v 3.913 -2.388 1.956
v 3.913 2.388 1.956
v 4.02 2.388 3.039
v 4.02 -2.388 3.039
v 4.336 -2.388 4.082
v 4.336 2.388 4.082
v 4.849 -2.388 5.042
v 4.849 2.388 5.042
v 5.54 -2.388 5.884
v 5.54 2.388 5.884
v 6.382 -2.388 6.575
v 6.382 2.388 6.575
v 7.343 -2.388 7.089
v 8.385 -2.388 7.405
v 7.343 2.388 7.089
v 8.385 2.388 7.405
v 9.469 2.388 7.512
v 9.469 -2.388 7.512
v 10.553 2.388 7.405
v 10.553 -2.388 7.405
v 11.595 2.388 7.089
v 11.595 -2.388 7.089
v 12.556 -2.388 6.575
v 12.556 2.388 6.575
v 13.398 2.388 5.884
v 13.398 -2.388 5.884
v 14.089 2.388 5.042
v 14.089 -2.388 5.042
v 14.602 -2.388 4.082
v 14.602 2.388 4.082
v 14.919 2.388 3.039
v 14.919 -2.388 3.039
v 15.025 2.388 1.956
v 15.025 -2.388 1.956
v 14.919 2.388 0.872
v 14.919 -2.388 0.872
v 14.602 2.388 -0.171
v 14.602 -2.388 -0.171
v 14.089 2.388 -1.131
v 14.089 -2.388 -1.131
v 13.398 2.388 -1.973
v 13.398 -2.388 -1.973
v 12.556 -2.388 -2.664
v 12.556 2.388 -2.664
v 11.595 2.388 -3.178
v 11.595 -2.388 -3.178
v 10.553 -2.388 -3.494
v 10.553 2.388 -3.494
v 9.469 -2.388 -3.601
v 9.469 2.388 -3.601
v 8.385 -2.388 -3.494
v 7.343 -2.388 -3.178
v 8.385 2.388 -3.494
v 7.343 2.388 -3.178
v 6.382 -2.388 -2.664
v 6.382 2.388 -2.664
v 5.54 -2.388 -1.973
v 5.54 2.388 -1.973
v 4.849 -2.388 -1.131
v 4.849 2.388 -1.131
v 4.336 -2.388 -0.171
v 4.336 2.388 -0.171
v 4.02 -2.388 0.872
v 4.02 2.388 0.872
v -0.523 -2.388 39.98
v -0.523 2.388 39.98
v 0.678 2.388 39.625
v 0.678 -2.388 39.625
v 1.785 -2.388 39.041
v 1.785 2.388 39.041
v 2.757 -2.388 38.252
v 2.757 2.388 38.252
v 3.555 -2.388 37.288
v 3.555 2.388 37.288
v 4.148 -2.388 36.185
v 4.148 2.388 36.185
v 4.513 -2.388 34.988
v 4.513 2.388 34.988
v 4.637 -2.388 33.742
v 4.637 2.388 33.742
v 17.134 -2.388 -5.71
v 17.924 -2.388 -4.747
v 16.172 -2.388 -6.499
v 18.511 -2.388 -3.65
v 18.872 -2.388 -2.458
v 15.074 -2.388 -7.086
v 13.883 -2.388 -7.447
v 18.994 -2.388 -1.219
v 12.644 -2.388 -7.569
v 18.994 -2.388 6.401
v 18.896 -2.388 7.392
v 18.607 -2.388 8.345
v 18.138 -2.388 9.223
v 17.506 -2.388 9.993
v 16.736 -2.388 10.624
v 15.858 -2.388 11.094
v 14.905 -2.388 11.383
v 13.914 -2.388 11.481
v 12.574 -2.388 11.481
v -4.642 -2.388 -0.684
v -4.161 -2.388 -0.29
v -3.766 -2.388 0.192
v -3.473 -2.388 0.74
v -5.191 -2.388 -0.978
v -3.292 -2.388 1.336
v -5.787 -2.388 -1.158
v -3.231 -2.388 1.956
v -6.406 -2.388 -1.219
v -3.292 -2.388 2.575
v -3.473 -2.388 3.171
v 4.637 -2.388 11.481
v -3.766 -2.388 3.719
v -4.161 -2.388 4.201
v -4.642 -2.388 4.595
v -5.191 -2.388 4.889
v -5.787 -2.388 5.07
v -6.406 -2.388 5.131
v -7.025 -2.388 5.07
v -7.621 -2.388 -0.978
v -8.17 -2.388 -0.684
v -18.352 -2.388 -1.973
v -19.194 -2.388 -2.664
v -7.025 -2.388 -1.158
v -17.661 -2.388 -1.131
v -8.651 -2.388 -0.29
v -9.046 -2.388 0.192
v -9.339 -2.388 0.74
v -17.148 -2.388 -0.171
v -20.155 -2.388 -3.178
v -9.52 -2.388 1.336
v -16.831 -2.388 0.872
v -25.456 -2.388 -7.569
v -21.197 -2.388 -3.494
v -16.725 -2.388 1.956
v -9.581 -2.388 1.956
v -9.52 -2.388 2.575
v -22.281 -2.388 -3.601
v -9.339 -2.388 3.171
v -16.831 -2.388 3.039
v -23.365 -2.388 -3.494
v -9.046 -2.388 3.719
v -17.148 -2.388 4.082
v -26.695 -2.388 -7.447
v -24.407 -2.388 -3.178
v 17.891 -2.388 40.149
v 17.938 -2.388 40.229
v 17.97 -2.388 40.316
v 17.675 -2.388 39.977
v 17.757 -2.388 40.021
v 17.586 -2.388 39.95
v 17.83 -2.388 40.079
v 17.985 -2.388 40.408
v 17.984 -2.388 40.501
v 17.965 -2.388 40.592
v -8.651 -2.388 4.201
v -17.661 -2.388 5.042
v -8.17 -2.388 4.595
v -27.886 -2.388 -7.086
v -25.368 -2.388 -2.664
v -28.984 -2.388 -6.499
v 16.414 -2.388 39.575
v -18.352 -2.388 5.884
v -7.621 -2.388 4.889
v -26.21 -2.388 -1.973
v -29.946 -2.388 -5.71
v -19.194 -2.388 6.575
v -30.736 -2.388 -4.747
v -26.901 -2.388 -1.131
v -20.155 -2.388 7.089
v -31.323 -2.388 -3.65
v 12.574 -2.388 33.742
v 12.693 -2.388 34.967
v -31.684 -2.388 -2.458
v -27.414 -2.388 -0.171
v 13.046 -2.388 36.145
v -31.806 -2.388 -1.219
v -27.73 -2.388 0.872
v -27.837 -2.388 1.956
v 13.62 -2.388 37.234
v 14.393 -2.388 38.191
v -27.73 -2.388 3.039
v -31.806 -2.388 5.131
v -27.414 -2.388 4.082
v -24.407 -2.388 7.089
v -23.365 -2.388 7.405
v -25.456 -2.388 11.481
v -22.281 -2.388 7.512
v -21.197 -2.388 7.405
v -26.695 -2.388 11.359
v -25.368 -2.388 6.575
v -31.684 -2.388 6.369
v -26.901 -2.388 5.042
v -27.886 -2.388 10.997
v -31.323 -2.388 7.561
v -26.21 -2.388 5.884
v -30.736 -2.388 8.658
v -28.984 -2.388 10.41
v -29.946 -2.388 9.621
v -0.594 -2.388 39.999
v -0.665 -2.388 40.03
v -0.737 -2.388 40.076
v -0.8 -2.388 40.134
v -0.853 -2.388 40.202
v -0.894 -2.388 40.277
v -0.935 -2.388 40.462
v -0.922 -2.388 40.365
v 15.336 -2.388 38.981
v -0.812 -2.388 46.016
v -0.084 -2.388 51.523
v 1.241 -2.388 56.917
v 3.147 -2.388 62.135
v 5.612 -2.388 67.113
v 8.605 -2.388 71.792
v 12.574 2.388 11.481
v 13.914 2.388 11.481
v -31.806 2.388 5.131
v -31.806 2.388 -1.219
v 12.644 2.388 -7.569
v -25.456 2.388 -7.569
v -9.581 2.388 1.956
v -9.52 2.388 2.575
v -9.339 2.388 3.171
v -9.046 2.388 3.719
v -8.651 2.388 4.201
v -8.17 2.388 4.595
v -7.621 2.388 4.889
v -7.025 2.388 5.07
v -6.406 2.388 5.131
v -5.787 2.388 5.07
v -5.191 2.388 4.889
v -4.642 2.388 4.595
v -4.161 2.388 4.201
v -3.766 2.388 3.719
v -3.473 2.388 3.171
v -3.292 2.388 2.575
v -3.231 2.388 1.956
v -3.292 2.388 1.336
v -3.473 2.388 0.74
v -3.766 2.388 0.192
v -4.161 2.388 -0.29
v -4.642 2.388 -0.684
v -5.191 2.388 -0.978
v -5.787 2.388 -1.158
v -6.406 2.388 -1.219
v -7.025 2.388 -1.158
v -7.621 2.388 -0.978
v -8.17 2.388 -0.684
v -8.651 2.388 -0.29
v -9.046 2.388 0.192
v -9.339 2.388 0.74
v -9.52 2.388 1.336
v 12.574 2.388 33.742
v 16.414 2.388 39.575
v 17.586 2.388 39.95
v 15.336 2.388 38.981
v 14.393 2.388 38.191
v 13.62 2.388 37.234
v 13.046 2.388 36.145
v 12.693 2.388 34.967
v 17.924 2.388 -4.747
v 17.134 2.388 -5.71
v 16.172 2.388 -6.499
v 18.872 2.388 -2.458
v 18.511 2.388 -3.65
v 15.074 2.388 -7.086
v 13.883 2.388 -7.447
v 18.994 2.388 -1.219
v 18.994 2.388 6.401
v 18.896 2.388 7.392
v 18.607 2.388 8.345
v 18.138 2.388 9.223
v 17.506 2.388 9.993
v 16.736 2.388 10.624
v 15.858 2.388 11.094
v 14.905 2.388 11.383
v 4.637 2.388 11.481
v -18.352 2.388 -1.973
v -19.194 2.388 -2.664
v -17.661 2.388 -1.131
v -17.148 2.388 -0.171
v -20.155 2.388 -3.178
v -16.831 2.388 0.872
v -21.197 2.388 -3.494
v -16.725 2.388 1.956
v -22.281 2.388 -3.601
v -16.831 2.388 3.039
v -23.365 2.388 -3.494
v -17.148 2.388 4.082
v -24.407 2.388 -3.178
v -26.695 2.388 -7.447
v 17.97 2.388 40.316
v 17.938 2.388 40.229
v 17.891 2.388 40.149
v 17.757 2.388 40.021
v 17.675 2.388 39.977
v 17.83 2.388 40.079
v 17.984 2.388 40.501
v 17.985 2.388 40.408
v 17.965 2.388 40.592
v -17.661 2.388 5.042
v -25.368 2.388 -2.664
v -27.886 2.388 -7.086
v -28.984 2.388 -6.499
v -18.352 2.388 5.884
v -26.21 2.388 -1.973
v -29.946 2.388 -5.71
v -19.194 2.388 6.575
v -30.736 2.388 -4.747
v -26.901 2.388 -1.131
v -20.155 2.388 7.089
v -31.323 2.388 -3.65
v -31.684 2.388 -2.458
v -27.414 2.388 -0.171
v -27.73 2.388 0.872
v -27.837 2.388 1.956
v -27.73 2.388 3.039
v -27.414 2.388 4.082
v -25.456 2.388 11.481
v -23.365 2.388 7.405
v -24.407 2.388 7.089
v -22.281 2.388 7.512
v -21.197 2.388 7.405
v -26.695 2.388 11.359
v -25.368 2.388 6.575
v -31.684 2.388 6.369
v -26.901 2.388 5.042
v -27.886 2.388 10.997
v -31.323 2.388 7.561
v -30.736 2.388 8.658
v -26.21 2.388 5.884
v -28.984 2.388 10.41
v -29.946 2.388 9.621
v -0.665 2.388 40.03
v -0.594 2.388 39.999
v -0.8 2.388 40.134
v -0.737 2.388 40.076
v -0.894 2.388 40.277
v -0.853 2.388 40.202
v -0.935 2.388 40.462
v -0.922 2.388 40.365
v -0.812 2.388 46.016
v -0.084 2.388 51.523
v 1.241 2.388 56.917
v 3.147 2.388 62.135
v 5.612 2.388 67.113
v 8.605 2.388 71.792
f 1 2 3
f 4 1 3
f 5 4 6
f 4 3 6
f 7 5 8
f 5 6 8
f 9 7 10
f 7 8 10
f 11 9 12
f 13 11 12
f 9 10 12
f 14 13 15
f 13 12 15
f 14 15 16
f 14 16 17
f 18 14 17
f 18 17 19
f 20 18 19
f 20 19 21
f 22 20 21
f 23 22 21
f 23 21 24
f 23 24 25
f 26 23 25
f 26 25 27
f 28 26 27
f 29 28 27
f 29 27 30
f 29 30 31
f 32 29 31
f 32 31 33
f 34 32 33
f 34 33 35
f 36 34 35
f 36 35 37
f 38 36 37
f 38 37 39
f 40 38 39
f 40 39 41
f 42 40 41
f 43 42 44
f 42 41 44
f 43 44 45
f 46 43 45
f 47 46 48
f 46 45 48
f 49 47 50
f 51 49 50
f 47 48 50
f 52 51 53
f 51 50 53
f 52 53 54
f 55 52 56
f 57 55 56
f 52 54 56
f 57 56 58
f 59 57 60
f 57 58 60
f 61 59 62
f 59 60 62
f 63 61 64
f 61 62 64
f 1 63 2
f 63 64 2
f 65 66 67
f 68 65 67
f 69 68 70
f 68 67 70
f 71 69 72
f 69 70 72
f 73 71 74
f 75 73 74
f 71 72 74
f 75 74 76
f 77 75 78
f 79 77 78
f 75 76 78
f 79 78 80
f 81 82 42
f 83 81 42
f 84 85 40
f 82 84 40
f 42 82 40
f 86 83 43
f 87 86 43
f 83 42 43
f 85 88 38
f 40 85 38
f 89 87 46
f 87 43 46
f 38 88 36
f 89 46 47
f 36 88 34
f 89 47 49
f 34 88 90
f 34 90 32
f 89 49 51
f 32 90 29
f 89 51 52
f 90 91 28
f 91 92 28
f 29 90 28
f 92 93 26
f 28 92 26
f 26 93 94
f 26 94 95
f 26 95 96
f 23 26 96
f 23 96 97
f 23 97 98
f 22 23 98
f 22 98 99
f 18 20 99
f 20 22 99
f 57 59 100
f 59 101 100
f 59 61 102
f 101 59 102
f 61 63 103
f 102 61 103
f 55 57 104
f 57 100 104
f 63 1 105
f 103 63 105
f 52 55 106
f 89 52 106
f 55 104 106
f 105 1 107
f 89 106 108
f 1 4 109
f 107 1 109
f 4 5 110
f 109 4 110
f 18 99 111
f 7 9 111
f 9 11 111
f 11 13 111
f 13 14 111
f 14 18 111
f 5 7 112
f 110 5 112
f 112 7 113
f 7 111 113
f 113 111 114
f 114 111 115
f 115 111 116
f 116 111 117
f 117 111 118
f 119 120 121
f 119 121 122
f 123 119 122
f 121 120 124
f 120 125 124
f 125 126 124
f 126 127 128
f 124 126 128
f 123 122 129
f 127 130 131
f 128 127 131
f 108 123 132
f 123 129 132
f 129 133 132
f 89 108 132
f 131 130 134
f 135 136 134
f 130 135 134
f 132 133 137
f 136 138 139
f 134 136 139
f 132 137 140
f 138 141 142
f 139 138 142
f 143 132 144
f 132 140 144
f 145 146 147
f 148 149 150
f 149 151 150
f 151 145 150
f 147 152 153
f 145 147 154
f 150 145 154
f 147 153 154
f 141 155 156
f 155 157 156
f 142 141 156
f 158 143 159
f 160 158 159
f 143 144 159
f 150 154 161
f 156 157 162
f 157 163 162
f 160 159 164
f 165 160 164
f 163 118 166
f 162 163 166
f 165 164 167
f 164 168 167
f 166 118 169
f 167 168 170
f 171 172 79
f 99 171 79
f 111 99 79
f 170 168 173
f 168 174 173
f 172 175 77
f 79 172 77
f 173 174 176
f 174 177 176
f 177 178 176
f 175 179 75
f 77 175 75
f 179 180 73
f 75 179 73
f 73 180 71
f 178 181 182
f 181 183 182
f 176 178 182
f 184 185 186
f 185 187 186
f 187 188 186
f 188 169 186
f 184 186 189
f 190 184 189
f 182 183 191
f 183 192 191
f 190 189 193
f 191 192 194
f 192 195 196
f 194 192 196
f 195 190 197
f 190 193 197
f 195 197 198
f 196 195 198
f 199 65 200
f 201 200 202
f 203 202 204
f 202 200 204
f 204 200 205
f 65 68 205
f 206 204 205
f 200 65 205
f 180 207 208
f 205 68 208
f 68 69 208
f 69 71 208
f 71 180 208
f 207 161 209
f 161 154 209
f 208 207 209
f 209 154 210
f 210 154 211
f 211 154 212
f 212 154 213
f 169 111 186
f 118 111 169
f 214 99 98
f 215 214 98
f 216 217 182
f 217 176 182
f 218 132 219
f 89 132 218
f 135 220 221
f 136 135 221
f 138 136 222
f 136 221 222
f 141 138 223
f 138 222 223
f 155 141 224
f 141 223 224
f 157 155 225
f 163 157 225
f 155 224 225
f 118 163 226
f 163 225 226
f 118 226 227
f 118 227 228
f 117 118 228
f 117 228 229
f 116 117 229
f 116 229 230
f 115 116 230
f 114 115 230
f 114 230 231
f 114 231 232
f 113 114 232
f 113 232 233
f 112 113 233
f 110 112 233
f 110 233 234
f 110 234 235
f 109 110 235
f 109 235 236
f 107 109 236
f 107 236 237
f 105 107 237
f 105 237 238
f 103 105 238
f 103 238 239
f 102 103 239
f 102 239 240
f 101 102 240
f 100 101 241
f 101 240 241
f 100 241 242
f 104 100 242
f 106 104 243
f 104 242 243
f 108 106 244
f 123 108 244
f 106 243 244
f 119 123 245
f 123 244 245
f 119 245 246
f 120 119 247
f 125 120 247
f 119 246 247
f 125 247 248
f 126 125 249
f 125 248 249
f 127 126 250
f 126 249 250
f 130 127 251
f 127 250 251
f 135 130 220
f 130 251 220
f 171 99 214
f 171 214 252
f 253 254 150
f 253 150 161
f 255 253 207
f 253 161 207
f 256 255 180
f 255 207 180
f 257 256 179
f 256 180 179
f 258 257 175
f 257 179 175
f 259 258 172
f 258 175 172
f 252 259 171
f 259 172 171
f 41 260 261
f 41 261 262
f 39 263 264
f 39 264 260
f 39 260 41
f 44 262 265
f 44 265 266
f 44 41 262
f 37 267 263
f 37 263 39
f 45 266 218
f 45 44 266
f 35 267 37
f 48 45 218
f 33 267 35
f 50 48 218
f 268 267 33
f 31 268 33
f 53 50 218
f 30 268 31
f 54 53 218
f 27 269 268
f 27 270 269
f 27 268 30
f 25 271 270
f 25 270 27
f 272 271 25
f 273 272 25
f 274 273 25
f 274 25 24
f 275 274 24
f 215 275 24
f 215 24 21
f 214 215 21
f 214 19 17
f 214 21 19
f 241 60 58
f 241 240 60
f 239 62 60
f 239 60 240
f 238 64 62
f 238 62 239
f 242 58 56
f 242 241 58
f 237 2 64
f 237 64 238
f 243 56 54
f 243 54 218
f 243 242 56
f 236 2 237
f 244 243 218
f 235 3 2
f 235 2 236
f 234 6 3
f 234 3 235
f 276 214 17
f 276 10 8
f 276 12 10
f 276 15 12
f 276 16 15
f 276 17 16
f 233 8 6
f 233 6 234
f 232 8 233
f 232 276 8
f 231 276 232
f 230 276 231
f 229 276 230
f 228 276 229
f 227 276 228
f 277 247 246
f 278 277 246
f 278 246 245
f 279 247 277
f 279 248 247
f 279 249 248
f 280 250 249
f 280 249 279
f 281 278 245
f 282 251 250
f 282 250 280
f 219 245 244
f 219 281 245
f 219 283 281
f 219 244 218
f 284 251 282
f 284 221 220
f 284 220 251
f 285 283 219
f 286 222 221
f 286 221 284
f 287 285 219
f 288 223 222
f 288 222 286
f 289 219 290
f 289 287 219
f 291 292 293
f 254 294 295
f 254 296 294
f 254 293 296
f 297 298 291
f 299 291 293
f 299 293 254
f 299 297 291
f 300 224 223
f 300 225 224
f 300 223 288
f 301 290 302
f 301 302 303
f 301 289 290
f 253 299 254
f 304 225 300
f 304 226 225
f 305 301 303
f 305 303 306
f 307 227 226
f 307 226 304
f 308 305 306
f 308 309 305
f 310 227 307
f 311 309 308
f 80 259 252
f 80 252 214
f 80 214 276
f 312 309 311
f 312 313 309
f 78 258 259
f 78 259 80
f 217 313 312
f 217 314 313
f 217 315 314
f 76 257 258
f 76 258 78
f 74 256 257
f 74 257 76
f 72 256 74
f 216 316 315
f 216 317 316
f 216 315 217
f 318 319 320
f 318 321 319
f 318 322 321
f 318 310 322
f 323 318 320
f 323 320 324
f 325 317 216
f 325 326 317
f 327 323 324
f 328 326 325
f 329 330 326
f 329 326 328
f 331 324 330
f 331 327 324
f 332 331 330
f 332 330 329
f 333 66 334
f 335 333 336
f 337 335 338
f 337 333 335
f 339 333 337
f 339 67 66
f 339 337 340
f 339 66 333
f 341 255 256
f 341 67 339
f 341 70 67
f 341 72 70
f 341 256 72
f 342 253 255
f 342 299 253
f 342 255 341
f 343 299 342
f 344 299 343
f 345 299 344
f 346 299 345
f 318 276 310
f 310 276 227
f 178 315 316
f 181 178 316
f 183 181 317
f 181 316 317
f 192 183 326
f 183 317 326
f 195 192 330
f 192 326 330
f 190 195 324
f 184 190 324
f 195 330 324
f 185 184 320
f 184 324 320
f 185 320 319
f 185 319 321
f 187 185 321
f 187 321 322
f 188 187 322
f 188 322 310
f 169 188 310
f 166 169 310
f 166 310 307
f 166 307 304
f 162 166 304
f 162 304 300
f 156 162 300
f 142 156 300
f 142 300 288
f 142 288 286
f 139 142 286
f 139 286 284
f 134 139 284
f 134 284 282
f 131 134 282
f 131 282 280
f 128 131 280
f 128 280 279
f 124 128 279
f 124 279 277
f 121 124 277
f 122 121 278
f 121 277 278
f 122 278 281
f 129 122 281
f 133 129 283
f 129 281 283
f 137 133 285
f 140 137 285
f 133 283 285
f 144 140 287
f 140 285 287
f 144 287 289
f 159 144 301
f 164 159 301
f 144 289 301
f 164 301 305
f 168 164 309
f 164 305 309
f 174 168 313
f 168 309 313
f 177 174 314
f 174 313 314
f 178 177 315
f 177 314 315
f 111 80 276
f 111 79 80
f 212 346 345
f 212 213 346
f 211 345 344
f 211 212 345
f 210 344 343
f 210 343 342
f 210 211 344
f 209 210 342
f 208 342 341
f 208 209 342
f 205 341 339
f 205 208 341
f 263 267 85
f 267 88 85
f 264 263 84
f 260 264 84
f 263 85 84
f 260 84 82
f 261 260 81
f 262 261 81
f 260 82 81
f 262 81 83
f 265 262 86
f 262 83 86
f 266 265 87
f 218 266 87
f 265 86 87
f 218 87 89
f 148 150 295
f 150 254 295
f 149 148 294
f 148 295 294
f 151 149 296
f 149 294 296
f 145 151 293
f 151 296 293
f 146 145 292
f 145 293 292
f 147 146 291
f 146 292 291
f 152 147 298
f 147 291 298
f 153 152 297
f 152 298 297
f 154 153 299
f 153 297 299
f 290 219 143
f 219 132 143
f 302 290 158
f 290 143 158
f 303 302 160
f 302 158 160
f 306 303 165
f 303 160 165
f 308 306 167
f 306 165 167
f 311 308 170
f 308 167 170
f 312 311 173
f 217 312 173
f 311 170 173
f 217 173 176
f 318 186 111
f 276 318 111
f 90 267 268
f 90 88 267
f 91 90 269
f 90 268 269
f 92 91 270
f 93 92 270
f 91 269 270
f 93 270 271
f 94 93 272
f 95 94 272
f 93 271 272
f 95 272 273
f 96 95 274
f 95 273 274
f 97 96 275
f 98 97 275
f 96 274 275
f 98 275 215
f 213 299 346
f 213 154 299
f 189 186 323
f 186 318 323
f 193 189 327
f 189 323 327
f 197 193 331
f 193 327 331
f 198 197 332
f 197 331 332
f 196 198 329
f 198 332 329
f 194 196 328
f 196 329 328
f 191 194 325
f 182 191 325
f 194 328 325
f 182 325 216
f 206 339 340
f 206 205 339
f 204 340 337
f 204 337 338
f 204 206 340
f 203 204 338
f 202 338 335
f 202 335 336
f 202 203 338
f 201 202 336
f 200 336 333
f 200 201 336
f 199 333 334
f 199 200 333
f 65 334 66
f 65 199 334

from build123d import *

# Parameters (mm, degrees)
F1_W           = 50.8
F1_H           = 19.05
F2_DEPTH       = 2.3876
F2_DEPTH_BACK  = 2.3876
F3_R           = 5.08
F4_R           = 6.35
F5_R           = 6.35
F7_D           = 11.1125
F9_D           = 11.1125
F11_D          = 6.35
F13_DEPTH      = 2.3876
F13_DEPTH_BACK = 2.3876
F15_DEPTH      = 2.3876
F15_DEPTH_BACK = 2.3876
F16_T1_DEPTH   = 4.7752
F16_T6_DEPTH   = 4.7752
F17_R          = 0.508


# Not quite as in the source:
# - a fillet or chamfer that OpenCascade refuses, or shapes differently, is made with other operations: its cross-section is extruded or revolved along the edge and cut away or added


with BuildPart() as f2:
    # F1 (on face) → F2 (new body, two sides)
    with BuildSketch(Plane.XZ) as f2_sk:
        with Locations((-6.4059151608, 1.9555166364)):
            Rectangle(F1_W, F1_H)
    extrude(amount=F2_DEPTH)
    extrude(f2_sk.sketch, amount=-F2_DEPTH_BACK)

    # F3
    f3_edges = [f2.edges().sort_by_distance(p)[0] for p in [
        (18.994085, 0, 11.480517),
    ]]
    fillet(f3_edges, radius=F3_R)

    # F4
    f4_edges = [f2.edges().sort_by_distance(p)[0] for p in [
        (18.994085, 0, -7.569483),
    ]]
    fillet(f4_edges, radius=F4_R)

    # F5
    f5_edges = [f2.edges().sort_by_distance(p)[0] for p in [
        (-31.805915, 0, 11.480517),
        (-31.805915, 0, -7.569483),
    ]]
    fillet(f5_edges, radius=F5_R)

    # F7 (through all)
    with Locations(Plane.XZ.offset(2.3876)):
        with Locations((9.4690848392, 1.9555166364)):
            Hole(F7_D / 2)

    # F9 (through all)
    with Locations(Plane.XZ.offset(2.3876)):
        with Locations((-22.2809151608, 1.9555166364)):
            Hole(F9_D / 2)

    # F11 (through all)
    with Locations(Plane.XZ.offset(2.3876)):
        with Locations((-6.4059151608, 1.9555166364)):
            Hole(F11_D / 2)

    # F12 (on Front) → F13 (join, two sides)
    with BuildSketch(Plane.XZ) as f13_sk:
        Polygon((8.6054187268, 40.0424157364), (4.6366687268, 40.0424157364), (4.6366687268, 11.4674157364), (12.5741687268, 11.4674157364), (12.5741687268, 40.0424157364), align=None)
    extrude(amount=F13_DEPTH)
    extrude(f13_sk.sketch, amount=-F13_DEPTH_BACK)

    # F14 (on Front) → F15 (join, two sides)
    with BuildSketch(Plane.XZ) as f15_sk:
        with BuildLine():
            Line((18.1304187268, 40.0424157364), (8.6054187268, 71.7924157364))
            ThreePointArc((8.6054187268, 71.7924157364), (1.180386736, 56.7161753336), (-0.9195812732, 40.0424157364))
            Line((-0.9195812732, 40.0424157364), (8.6054187268, 40.0424157364))
            Line((8.6054187268, 40.0424157364), (18.1304187268, 40.0424157364))
        make_face()
    extrude(amount=F15_DEPTH)
    extrude(f15_sk.sketch, amount=-F15_DEPTH_BACK)

    # F16: fillet of radius 6.35 on 2 edges, made by hand

    # F16_s2 → F16_t1 (join)
    with BuildSketch(Plane.XZ.offset(-2.3876)):
        with BuildLine():
            ThreePointArc((-0.9195812732, 40.0424157364), (3.0491687268, 37.9423506332), (4.6366687268, 33.7422204269))
            Line((4.6366687268, 33.7422204269), (4.7636687268, 33.7422204269))
            Line((4.7636687268, 33.7422204269), (4.7636687268, 40.0424157364))
            Line((4.7636687268, 40.0424157364), (4.6366687268, 40.1694157364))
            ThreePointArc((4.6366687268, 40.1694157364), (1.8585437268, 40.1694157364), (-0.9037062732, 40.1684196426))
            Line((-0.9037062732, 40.1684196426), (-0.9195812732, 40.0424157364))
        make_face()
    extrude(amount=F16_T1_DEPTH)


with BuildPart() as f16_tool4:
    # F16_s5 → F16_t6 (new body)
    with BuildSketch(Plane.XZ.offset(2.3876)):
        with BuildLine():
            ThreePointArc((18.1304187268, 40.0424157364), (14.1616687268, 37.9423506332), (12.5741687268, 33.7422204269))
            Line((12.5741687268, 33.7422204269), (12.4471687268, 33.7422204269))
            Line((12.4471687268, 33.7422204269), (12.4471687268, 40.0424157364))
            Line((12.4471687268, 40.0424157364), (12.5741687268, 40.1694157364))
            ThreePointArc((12.5741687268, 40.1694157364), (15.3522937268, 40.1694157364), (18.1145437268, 40.1684196426))
            Line((18.1145437268, 40.1684196426), (18.1304187268, 40.0424157364))
        make_face()
    extrude(amount=-F16_T6_DEPTH)

    split(bisect_by=Plane(origin=(27.6542600438, 0, 8.2962780131), x_dir=(0, 1, 0), z_dir=(-0.9578262852, 0, -0.2873478856)), keep=Keep.TOP)


with BuildPart() as f2_1:
    add(f2.part)

    # F16_t3: union F16_tool4
    add(f16_tool4.part)

    # F17
    f17_edges = [f2_1.edges().sort_by_distance(p)[0] for p in [
        (18.130419, 0, 40.042416),
        (-0.919581, 0, 40.042416),
    ]]
    fillet(f17_edges, radius=F17_R)


solid = f2_1.part
